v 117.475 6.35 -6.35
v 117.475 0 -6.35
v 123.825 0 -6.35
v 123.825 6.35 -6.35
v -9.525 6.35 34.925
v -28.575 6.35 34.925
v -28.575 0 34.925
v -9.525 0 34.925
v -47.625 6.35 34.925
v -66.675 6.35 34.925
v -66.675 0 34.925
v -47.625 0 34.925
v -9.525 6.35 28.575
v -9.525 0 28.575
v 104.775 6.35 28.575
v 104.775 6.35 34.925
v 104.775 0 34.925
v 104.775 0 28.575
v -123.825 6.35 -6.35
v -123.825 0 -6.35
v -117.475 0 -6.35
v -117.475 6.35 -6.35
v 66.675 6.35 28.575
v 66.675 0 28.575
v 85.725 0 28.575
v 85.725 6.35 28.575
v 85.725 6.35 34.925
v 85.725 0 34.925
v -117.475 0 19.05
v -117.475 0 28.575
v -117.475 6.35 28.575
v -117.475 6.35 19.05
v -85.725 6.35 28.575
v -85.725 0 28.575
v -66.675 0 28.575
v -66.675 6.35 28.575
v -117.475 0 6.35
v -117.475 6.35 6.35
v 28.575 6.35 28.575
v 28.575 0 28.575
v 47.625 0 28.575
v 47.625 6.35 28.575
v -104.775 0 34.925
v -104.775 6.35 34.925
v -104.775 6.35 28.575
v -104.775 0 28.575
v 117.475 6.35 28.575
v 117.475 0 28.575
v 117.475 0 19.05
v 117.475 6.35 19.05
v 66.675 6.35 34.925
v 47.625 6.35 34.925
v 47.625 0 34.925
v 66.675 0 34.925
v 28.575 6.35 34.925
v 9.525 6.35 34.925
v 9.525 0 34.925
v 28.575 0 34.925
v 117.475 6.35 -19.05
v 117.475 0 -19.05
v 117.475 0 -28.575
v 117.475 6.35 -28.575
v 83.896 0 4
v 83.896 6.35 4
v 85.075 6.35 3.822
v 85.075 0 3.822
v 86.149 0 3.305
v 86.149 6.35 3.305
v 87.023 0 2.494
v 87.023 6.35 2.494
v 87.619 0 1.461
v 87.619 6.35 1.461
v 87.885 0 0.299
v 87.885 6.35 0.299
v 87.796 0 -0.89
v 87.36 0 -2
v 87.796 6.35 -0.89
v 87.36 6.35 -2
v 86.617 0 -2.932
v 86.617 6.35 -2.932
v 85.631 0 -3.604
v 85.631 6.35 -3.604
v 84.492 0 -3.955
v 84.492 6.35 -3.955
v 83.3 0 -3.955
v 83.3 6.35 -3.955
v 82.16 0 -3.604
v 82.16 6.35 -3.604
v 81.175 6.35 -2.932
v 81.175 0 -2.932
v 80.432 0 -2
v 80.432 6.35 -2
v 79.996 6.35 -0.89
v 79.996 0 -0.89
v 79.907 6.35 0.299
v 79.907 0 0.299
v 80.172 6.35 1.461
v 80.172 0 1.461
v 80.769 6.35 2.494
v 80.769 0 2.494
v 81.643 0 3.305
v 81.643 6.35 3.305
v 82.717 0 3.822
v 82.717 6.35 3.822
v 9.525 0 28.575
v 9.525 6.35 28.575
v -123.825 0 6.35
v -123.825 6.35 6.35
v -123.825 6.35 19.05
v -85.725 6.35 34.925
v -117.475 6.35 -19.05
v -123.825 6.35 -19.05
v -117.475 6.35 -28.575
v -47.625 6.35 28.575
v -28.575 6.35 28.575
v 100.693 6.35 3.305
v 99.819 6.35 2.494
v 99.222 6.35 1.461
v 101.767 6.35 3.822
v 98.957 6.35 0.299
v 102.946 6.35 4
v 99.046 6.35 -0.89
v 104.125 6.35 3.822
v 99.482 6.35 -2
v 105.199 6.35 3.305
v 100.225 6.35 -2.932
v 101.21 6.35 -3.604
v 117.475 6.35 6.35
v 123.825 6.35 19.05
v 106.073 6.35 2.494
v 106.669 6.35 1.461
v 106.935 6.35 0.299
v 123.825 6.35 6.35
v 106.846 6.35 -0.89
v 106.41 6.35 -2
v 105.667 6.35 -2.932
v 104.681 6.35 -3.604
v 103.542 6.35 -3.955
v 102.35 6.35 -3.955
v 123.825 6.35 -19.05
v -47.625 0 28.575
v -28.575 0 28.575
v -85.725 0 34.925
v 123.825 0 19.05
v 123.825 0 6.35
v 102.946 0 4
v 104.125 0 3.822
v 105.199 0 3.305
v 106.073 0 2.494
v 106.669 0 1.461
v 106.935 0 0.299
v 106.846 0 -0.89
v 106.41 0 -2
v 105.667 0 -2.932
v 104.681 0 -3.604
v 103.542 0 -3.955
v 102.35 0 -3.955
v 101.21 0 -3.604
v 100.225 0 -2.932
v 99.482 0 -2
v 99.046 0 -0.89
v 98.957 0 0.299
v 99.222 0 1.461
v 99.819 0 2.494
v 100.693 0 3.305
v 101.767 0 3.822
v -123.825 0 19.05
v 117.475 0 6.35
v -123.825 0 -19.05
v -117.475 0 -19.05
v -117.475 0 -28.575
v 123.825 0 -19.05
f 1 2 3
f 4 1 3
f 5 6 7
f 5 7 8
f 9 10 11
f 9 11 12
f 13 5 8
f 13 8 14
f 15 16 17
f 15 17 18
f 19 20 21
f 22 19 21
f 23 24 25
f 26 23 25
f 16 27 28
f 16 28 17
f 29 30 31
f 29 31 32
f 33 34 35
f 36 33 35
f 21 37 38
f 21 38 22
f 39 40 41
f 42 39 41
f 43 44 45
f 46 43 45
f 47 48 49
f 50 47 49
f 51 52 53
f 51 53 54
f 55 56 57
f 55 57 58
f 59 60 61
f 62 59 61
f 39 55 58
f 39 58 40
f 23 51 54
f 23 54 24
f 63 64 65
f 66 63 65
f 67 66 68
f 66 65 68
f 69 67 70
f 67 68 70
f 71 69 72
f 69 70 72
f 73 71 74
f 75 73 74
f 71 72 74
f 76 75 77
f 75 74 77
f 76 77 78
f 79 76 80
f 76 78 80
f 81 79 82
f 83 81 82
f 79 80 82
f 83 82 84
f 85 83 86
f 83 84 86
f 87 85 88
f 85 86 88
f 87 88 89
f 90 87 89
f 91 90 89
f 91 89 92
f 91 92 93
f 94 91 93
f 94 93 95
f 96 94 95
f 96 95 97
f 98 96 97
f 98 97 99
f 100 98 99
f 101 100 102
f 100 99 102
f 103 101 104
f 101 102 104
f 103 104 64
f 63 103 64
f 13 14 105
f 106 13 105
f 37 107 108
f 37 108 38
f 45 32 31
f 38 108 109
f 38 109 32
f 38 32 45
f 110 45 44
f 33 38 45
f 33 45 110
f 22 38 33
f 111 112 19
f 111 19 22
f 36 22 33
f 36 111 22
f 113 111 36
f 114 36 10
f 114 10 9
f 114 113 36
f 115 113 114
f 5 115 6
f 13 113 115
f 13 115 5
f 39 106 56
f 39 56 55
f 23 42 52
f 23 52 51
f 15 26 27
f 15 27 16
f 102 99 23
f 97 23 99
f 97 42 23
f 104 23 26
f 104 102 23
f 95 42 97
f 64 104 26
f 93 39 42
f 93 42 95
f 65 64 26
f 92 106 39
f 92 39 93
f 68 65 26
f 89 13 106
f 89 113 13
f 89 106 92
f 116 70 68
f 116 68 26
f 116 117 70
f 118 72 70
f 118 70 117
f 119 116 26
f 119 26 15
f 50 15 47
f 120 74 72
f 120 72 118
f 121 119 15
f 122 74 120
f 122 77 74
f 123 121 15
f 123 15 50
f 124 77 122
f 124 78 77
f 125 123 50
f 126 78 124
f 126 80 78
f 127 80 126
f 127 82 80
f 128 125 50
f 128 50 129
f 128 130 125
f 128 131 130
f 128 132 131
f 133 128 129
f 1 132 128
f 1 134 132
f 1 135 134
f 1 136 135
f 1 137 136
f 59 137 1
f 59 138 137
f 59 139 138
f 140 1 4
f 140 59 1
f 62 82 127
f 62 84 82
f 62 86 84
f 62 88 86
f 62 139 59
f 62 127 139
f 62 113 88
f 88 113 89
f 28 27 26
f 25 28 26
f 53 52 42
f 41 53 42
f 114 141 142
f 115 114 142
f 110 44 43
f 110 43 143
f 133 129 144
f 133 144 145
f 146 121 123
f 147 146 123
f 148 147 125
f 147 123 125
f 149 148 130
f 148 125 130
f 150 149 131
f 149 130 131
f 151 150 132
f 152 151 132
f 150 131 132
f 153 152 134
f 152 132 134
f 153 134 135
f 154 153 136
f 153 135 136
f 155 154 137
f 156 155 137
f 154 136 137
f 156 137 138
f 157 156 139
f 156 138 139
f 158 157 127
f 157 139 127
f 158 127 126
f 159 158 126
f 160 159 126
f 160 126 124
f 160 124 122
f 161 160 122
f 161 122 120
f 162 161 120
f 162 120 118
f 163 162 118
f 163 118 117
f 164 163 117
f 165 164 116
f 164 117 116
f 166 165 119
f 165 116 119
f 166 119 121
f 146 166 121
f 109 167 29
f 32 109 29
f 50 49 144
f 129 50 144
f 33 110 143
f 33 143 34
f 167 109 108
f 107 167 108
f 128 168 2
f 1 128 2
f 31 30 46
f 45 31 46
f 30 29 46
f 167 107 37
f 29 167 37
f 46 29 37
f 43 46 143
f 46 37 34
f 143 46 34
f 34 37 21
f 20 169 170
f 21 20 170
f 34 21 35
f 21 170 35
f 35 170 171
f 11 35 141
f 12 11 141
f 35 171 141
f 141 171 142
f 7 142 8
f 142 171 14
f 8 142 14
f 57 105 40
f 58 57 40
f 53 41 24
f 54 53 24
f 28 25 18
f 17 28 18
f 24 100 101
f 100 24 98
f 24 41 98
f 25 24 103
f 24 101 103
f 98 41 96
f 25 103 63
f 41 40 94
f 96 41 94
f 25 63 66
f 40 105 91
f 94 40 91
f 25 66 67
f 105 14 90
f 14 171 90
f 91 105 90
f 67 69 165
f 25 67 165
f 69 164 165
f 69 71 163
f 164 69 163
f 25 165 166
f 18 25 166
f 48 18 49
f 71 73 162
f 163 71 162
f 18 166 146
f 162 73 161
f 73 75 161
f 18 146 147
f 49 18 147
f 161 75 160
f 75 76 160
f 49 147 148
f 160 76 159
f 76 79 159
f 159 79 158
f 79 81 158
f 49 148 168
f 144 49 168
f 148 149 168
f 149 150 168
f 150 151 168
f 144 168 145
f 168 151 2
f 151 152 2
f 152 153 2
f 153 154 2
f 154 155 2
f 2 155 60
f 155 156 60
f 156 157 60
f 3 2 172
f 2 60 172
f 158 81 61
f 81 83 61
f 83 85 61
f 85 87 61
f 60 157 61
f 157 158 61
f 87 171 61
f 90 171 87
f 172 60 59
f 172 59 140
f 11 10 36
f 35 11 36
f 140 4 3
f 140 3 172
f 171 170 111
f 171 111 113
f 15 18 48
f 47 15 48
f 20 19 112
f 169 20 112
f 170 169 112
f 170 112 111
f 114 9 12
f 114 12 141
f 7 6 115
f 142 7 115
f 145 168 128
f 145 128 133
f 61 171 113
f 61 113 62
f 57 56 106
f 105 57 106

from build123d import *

# Parameters (mm, degrees)
ESQUISSE1_W                     = 234.95
ESQUISSE1_H                     = 57.15
BOSS_EXTRU_1_DEPTH              = 6.35
ESQUISSE3_W                     = 19.05
ESQUISSE3_H                     = 6.35
BOSS_EXTRU_2_DEPTH              = 6.35
R_P_TITION_LIN_AIRE2_COUNT      = 6
R_P_TITION_LIN_AIRE2_PITCH      = 38.1
ESQUISSE5_W                     = 6.35
ESQUISSE5_H                     = 12.7
BOSS_EXTRU_4_DEPTH              = 6.35
R_P_TITION_LIN_AIRE4_COUNT      = 2
R_P_TITION_LIN_AIRE4_PITCH      = 25.4
R_P_TITION_LIN_AIRE4_COUNT_DIR2 = 2
R_P_TITION_LIN_AIRE4_PITCH_DIR2 = 241.3
ESQUISSE2_R                     = 4
ENL_V_MAT_EXTRU_1_DEPTH         = 6.35


with BuildPart() as part:
    # Esquisse1 → Boss.-Extru.1 (new body)
    with BuildSketch(Plane(origin=(0, 0, 0), x_dir=(1, 0, 0), z_dir=(0, 1, 0))):
        Rectangle(ESQUISSE1_W, ESQUISSE1_H)
    extrude(amount=BOSS_EXTRU_1_DEPTH)

    # Esquisse3 → Boss.-Extru.2 (add)
    with BuildSketch(Plane(origin=(0, 6.35, 0), x_dir=(1, 0, 0), z_dir=(0, 1, 0))):
        with Locations((-95.25, -31.75)):
            Rectangle(ESQUISSE3_W, ESQUISSE3_H)
    boss_extru_2 = extrude(amount=-BOSS_EXTRU_2_DEPTH)

    # Répétition linéaire2: Boss.-Extru.2 ×6
    with Locations(*[(i * R_P_TITION_LIN_AIRE2_PITCH, 0, 0) for i in range(1, R_P_TITION_LIN_AIRE2_COUNT)]):
        add(boss_extru_2)

    # Esquisse5 → Boss.-Extru.4 (add)
    with BuildSketch(Plane(origin=(0, 6.35, 0), x_dir=(1, 0, 0), z_dir=(0, 1, 0))):
        with Locations((-120.65, -12.7)):
            Rectangle(ESQUISSE5_W, ESQUISSE5_H)
    boss_extru_4 = extrude(amount=-BOSS_EXTRU_4_DEPTH)

    # Répétition linéaire4: Boss.-Extru.4 2 × 2
    with Locations(*[(j * R_P_TITION_LIN_AIRE4_PITCH_DIR2, 0, -i * R_P_TITION_LIN_AIRE4_PITCH) for i in range(R_P_TITION_LIN_AIRE4_COUNT) for j in range(R_P_TITION_LIN_AIRE4_COUNT_DIR2) if (i, j) != (0, 0)]):
        add(boss_extru_4)

    # Esquisse2 → Enlèv. mat.-Extru.1 (cut)
    with BuildSketch(Plane(origin=(0, 6.35, 0), x_dir=(1, 0, 0), z_dir=(0, 1, 0))):
        with Locations(Location((83.895833333, 0, 0), (0, 0, 270))):
            Circle(ESQUISSE2_R)
        with Locations(Location((102.945833333, 0, 0), (0, 0, 270))):
            Circle(ESQUISSE2_R)
    extrude(amount=-ENL_V_MAT_EXTRU_1_DEPTH, mode=Mode.SUBTRACT)


solid = part.part
